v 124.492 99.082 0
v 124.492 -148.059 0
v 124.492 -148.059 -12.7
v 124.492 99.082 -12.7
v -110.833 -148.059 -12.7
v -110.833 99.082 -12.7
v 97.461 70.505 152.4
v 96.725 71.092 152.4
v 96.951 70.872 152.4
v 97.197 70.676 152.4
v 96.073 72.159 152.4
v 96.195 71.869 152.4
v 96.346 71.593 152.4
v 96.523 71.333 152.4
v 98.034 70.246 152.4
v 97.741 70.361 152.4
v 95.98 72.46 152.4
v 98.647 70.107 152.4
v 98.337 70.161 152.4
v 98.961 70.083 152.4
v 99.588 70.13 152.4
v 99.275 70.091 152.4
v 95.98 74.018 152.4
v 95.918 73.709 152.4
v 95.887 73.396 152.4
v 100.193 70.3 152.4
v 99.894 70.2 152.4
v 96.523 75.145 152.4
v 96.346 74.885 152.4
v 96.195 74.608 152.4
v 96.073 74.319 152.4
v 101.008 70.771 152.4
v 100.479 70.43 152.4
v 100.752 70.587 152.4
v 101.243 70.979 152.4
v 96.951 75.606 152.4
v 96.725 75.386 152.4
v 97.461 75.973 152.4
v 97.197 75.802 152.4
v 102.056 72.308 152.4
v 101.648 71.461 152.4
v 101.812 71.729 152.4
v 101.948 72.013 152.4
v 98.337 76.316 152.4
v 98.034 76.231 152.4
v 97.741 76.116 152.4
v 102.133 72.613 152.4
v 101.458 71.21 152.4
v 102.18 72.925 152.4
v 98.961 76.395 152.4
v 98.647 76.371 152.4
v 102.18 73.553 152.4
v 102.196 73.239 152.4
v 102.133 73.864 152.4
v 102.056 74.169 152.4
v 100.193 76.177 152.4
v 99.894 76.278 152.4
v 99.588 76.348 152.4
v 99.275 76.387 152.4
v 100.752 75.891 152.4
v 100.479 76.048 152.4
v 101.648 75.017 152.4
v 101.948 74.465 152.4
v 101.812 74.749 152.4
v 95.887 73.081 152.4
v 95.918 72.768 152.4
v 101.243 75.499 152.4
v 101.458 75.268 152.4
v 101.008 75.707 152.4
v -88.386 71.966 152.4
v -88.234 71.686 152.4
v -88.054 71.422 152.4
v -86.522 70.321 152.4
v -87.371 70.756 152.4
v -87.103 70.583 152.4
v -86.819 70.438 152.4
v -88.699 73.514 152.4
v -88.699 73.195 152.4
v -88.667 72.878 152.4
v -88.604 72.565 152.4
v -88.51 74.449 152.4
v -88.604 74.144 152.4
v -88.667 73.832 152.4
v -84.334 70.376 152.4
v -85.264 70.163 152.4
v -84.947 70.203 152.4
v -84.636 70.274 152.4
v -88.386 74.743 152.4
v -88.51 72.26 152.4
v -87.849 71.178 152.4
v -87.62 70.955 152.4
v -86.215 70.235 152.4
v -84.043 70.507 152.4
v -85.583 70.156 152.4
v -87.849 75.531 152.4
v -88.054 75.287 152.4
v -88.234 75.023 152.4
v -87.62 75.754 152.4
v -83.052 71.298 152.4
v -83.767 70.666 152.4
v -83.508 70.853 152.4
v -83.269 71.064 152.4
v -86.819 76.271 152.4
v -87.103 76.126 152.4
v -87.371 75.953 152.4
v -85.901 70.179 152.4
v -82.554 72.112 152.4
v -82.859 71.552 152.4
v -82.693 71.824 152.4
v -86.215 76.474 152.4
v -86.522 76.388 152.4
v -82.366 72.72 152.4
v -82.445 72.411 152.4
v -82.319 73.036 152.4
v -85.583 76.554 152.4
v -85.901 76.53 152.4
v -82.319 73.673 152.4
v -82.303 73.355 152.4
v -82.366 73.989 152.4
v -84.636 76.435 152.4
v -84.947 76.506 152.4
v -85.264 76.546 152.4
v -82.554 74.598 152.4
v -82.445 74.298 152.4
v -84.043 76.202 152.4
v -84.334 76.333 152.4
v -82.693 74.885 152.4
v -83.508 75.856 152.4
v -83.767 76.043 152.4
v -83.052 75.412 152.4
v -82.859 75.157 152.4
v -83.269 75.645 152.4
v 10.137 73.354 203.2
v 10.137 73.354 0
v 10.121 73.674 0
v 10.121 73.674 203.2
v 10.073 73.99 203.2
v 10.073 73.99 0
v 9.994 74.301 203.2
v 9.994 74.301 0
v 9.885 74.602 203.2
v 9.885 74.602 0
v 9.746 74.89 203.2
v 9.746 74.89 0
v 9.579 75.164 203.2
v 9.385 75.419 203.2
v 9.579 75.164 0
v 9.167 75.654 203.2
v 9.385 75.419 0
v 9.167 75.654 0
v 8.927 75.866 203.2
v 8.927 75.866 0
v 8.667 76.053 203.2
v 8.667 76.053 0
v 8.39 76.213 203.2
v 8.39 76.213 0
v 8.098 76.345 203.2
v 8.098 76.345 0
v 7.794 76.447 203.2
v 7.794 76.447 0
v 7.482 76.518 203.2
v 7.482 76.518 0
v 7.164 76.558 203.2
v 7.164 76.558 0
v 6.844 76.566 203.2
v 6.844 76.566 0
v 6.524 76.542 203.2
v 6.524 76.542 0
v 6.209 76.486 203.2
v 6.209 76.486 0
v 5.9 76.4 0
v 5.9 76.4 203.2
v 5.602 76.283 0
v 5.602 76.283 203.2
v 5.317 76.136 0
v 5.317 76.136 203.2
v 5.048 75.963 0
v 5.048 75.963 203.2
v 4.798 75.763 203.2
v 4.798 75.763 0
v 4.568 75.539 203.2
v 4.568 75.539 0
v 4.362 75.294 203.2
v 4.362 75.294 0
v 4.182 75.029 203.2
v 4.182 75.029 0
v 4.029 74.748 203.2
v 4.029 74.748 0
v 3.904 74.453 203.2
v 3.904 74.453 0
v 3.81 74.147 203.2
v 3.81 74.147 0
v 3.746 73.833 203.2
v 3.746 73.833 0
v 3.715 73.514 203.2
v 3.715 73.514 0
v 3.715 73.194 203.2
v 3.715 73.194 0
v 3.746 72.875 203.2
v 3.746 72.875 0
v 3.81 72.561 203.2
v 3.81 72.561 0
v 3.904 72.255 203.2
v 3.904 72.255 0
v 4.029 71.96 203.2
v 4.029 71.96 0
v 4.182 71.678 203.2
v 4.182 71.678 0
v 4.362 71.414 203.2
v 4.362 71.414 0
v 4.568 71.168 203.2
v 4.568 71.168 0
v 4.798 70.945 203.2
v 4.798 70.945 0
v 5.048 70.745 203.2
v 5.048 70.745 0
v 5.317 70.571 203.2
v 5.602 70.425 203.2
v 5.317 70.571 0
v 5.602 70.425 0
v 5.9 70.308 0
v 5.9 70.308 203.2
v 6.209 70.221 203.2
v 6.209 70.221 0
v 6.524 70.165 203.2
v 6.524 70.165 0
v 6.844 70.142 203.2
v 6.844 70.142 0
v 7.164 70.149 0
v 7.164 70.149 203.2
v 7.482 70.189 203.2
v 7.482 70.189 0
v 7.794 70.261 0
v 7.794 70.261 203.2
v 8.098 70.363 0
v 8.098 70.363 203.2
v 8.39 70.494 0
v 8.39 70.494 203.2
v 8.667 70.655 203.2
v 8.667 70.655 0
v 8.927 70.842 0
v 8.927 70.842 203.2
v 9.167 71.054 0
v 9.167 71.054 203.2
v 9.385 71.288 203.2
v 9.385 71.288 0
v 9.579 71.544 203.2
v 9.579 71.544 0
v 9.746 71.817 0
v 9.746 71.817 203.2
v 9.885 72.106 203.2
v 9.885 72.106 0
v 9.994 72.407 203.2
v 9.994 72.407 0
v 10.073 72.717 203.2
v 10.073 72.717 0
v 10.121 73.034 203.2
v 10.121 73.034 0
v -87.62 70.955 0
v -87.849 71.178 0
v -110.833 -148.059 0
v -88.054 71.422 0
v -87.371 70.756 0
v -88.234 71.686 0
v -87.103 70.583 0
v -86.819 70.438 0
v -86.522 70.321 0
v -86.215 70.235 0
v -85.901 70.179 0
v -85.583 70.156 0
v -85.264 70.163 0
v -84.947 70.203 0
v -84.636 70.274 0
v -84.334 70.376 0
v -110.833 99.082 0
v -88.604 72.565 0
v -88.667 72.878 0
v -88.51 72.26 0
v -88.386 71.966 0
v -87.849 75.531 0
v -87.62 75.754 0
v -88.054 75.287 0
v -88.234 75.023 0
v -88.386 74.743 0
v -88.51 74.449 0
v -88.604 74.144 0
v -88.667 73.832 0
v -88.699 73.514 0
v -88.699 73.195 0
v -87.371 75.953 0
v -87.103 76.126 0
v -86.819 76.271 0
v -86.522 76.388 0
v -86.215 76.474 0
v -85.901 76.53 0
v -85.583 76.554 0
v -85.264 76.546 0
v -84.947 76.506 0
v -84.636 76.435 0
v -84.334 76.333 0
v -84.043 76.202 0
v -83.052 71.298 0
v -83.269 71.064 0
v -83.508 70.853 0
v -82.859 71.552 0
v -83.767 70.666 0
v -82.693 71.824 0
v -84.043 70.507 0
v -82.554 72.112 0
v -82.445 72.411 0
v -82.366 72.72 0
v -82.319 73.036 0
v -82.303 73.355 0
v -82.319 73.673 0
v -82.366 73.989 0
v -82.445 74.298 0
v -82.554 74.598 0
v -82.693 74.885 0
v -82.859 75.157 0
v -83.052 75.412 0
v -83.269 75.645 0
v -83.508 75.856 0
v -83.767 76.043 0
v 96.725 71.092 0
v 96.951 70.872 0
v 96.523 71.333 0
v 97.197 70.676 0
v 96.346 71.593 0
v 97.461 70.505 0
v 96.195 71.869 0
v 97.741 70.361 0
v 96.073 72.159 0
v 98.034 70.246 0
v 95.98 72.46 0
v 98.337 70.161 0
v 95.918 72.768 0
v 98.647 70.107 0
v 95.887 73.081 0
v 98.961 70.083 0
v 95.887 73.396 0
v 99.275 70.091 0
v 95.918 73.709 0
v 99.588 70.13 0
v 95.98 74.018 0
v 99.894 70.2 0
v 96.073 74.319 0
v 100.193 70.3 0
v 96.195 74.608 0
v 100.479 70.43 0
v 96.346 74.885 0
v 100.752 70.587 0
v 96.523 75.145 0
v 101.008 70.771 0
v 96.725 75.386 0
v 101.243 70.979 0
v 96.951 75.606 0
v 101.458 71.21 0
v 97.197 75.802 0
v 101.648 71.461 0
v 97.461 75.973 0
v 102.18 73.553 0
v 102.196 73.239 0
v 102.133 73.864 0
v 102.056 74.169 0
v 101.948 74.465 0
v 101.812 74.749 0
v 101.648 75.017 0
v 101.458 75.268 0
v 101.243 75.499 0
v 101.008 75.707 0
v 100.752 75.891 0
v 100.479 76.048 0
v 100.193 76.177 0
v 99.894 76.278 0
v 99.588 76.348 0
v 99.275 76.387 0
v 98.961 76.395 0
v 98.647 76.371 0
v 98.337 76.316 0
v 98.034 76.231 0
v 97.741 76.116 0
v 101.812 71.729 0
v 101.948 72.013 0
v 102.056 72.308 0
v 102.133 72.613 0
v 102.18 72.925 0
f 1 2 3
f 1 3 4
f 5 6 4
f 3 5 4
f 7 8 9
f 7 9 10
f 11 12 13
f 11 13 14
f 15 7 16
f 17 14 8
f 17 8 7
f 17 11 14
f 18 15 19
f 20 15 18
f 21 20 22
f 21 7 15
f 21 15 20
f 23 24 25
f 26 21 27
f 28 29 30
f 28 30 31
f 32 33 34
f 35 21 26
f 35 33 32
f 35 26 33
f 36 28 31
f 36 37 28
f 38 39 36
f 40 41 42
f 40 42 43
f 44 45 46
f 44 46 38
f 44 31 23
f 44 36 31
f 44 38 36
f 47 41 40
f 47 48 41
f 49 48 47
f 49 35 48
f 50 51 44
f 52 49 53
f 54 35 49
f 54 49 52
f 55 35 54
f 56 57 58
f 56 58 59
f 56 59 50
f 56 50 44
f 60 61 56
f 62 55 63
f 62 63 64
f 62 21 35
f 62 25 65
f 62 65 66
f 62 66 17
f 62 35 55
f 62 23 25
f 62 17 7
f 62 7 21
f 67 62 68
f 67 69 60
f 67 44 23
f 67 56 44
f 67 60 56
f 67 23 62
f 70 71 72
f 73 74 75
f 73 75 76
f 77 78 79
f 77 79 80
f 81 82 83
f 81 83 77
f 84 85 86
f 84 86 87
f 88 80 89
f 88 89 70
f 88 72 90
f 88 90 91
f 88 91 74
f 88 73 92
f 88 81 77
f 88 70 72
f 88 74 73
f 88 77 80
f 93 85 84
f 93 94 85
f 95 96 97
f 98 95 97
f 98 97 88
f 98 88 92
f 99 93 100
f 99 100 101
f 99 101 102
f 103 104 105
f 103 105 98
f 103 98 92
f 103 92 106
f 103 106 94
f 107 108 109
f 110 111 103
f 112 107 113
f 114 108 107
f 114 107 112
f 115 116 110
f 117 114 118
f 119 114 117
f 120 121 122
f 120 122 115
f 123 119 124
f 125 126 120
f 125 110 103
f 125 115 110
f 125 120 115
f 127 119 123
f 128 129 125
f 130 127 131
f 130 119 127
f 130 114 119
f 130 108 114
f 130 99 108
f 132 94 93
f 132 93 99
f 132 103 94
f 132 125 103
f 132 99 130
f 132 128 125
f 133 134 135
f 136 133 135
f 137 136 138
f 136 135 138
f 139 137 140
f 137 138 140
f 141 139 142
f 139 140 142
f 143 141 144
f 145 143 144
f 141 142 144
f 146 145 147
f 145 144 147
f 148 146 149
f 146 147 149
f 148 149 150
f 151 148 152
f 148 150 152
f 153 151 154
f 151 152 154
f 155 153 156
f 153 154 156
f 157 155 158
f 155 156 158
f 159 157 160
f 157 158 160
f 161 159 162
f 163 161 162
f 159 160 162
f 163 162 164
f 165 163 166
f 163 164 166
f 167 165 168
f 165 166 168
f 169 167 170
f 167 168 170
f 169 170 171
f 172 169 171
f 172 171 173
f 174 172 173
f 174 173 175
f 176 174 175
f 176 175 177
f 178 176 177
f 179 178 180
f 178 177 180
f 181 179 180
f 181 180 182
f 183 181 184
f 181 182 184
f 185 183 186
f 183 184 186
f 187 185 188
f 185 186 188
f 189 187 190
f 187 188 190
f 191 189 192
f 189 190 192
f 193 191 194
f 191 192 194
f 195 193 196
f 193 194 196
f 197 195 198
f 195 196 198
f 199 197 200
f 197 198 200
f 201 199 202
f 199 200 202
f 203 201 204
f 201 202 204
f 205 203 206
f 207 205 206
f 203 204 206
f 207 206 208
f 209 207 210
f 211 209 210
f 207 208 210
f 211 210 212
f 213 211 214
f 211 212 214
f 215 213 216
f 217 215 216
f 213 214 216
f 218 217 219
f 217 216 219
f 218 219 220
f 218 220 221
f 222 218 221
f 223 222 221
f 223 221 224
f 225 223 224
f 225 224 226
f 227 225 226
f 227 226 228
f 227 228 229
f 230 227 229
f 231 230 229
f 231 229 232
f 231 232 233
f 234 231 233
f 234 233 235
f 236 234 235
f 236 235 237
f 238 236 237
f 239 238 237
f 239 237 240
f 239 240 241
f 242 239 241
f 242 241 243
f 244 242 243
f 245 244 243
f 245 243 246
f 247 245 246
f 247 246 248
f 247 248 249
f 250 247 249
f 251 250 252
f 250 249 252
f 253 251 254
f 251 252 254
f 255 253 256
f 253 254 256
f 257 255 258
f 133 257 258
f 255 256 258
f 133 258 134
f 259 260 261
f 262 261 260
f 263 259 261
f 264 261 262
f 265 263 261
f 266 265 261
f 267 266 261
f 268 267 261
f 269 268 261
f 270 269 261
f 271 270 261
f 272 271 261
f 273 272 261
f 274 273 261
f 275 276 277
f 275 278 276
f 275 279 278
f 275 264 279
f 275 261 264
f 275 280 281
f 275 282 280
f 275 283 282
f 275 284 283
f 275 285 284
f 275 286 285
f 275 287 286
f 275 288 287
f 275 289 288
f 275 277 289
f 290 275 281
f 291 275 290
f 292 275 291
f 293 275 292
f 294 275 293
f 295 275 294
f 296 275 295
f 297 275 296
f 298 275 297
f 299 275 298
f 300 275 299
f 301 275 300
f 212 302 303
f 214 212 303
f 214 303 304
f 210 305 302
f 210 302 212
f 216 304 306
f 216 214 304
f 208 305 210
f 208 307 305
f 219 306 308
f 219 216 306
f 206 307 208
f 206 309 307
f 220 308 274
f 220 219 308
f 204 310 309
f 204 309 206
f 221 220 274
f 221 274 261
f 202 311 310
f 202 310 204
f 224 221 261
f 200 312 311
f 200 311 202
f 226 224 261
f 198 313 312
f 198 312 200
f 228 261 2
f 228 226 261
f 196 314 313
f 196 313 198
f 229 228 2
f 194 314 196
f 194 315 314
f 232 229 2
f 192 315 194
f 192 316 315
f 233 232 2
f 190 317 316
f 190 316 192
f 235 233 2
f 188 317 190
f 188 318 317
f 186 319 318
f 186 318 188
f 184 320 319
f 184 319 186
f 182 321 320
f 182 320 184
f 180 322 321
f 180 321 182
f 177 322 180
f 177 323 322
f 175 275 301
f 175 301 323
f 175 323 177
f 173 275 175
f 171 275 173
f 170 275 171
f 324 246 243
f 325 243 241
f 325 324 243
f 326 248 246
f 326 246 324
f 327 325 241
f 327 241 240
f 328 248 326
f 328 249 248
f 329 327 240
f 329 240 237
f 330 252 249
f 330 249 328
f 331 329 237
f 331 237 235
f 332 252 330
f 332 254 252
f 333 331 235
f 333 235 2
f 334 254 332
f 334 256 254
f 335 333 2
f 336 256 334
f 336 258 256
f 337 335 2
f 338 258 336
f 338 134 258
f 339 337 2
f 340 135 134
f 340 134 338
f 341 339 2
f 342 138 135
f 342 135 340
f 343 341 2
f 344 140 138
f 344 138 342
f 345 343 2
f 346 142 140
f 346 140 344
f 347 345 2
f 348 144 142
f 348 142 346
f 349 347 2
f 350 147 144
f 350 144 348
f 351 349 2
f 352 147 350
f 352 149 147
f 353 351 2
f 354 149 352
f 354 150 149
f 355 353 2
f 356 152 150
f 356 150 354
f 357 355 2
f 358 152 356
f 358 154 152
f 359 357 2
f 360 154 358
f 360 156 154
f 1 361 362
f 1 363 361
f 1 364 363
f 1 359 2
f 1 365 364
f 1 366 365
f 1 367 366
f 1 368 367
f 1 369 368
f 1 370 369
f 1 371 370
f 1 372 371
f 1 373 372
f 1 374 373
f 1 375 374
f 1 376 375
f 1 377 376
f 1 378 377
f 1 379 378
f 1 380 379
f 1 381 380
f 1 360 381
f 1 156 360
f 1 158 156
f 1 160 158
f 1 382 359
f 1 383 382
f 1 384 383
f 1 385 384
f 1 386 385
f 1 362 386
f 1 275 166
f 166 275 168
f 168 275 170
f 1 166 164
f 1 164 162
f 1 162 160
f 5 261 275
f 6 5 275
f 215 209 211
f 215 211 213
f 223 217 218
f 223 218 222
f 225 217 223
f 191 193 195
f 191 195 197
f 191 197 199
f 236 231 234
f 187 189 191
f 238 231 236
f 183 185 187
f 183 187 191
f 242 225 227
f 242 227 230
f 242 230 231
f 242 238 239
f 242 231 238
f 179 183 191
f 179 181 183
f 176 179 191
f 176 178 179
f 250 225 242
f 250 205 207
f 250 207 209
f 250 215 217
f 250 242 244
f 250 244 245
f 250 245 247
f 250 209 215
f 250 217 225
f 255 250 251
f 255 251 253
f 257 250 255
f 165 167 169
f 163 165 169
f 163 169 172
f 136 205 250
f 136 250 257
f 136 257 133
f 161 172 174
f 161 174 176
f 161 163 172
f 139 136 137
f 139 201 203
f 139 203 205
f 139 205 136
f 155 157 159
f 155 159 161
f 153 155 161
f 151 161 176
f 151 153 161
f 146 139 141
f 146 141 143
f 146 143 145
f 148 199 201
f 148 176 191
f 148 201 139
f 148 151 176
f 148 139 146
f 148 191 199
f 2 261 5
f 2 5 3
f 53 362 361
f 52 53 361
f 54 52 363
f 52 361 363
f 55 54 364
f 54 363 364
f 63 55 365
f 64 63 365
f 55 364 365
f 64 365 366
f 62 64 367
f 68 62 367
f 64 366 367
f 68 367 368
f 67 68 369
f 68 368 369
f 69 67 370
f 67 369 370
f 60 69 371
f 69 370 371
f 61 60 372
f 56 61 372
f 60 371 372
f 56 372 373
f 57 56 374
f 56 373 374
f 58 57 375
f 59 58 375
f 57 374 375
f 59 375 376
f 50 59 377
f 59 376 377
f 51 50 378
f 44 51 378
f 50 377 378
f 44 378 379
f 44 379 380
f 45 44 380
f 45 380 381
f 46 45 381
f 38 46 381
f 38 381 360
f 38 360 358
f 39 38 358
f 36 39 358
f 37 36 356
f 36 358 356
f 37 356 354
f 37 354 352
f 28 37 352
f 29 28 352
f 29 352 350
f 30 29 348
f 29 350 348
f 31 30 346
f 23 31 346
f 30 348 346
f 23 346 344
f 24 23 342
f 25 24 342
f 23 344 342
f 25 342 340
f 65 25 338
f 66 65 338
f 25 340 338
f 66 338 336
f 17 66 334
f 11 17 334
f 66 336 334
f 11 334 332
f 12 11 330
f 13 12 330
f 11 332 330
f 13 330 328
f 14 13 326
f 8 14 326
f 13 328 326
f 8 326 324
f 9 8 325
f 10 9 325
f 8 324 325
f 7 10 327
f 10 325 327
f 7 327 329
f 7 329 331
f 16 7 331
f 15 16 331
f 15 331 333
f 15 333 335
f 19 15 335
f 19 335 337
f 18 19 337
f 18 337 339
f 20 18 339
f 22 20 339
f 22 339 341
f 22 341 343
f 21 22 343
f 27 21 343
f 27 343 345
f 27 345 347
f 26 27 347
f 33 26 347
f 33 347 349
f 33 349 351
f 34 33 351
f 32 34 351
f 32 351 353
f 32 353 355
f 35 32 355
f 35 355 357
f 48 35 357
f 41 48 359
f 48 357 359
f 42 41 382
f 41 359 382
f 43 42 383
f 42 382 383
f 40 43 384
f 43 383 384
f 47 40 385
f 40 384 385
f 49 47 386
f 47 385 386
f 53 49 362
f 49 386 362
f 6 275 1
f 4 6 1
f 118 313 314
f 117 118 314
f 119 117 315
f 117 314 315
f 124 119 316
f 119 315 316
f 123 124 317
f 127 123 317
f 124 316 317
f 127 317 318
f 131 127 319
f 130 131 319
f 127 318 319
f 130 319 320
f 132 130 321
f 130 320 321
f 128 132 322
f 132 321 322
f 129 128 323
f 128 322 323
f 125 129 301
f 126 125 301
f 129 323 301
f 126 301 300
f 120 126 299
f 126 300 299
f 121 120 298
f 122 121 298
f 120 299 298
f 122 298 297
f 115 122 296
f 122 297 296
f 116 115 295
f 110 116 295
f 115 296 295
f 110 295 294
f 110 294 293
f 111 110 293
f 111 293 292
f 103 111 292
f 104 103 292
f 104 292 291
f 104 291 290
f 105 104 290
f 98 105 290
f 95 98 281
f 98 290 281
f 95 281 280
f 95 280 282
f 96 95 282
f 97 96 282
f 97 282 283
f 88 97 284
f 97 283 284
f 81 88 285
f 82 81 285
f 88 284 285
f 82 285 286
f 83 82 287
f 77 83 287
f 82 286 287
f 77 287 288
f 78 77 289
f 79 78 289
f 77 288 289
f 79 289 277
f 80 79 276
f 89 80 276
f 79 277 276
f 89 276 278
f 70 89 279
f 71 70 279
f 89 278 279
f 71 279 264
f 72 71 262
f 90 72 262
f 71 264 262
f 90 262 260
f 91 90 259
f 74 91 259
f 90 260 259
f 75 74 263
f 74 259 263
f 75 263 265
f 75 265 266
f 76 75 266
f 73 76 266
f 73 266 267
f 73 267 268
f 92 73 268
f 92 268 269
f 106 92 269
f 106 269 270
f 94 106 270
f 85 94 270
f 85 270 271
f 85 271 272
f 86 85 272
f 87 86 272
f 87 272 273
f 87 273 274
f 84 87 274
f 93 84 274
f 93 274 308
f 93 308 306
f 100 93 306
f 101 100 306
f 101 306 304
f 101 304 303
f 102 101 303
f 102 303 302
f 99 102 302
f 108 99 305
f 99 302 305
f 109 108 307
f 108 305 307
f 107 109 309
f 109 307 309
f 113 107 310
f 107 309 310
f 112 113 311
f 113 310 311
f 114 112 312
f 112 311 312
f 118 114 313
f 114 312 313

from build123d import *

# Parameters (mm, degrees)
F0_W     = 235.324252
F0_H     = 247.140977
F1_DEPTH = 12.7
F2_R     = 3.200051
F3_DEPTH = 152.4
F4_R     = 3.156732
F5_DEPTH = 152.4
F6_R     = 3.21323
F7_DEPTH = 203.2


with BuildPart() as f1:
    # F0 (on Top) → F1 (new body)
    with BuildSketch(Plane.XY):
        with Locations((6.829398, -24.4885)):
            Rectangle(F0_W, F0_H)
    extrude(amount=-F1_DEPTH)

    # F2 (on face) → F3 (join)
    with BuildSketch(Plane.XY):
        with Locations((-85.502937, 73.354565)):
            Circle(F2_R)
    extrude(amount=F3_DEPTH)

    # F4 (on face) → F5 (join)
    with BuildSketch(Plane.XY):
        with Locations((99.039346, 73.238835)):
            Circle(F4_R)
    extrude(amount=F5_DEPTH)

    # F6 (on face) → F7 (join)
    with BuildSketch(Plane.XY):
        with Locations((6.923744, 73.353745)):
            Circle(F6_R)
    extrude(amount=F7_DEPTH)


solid = f1.part
